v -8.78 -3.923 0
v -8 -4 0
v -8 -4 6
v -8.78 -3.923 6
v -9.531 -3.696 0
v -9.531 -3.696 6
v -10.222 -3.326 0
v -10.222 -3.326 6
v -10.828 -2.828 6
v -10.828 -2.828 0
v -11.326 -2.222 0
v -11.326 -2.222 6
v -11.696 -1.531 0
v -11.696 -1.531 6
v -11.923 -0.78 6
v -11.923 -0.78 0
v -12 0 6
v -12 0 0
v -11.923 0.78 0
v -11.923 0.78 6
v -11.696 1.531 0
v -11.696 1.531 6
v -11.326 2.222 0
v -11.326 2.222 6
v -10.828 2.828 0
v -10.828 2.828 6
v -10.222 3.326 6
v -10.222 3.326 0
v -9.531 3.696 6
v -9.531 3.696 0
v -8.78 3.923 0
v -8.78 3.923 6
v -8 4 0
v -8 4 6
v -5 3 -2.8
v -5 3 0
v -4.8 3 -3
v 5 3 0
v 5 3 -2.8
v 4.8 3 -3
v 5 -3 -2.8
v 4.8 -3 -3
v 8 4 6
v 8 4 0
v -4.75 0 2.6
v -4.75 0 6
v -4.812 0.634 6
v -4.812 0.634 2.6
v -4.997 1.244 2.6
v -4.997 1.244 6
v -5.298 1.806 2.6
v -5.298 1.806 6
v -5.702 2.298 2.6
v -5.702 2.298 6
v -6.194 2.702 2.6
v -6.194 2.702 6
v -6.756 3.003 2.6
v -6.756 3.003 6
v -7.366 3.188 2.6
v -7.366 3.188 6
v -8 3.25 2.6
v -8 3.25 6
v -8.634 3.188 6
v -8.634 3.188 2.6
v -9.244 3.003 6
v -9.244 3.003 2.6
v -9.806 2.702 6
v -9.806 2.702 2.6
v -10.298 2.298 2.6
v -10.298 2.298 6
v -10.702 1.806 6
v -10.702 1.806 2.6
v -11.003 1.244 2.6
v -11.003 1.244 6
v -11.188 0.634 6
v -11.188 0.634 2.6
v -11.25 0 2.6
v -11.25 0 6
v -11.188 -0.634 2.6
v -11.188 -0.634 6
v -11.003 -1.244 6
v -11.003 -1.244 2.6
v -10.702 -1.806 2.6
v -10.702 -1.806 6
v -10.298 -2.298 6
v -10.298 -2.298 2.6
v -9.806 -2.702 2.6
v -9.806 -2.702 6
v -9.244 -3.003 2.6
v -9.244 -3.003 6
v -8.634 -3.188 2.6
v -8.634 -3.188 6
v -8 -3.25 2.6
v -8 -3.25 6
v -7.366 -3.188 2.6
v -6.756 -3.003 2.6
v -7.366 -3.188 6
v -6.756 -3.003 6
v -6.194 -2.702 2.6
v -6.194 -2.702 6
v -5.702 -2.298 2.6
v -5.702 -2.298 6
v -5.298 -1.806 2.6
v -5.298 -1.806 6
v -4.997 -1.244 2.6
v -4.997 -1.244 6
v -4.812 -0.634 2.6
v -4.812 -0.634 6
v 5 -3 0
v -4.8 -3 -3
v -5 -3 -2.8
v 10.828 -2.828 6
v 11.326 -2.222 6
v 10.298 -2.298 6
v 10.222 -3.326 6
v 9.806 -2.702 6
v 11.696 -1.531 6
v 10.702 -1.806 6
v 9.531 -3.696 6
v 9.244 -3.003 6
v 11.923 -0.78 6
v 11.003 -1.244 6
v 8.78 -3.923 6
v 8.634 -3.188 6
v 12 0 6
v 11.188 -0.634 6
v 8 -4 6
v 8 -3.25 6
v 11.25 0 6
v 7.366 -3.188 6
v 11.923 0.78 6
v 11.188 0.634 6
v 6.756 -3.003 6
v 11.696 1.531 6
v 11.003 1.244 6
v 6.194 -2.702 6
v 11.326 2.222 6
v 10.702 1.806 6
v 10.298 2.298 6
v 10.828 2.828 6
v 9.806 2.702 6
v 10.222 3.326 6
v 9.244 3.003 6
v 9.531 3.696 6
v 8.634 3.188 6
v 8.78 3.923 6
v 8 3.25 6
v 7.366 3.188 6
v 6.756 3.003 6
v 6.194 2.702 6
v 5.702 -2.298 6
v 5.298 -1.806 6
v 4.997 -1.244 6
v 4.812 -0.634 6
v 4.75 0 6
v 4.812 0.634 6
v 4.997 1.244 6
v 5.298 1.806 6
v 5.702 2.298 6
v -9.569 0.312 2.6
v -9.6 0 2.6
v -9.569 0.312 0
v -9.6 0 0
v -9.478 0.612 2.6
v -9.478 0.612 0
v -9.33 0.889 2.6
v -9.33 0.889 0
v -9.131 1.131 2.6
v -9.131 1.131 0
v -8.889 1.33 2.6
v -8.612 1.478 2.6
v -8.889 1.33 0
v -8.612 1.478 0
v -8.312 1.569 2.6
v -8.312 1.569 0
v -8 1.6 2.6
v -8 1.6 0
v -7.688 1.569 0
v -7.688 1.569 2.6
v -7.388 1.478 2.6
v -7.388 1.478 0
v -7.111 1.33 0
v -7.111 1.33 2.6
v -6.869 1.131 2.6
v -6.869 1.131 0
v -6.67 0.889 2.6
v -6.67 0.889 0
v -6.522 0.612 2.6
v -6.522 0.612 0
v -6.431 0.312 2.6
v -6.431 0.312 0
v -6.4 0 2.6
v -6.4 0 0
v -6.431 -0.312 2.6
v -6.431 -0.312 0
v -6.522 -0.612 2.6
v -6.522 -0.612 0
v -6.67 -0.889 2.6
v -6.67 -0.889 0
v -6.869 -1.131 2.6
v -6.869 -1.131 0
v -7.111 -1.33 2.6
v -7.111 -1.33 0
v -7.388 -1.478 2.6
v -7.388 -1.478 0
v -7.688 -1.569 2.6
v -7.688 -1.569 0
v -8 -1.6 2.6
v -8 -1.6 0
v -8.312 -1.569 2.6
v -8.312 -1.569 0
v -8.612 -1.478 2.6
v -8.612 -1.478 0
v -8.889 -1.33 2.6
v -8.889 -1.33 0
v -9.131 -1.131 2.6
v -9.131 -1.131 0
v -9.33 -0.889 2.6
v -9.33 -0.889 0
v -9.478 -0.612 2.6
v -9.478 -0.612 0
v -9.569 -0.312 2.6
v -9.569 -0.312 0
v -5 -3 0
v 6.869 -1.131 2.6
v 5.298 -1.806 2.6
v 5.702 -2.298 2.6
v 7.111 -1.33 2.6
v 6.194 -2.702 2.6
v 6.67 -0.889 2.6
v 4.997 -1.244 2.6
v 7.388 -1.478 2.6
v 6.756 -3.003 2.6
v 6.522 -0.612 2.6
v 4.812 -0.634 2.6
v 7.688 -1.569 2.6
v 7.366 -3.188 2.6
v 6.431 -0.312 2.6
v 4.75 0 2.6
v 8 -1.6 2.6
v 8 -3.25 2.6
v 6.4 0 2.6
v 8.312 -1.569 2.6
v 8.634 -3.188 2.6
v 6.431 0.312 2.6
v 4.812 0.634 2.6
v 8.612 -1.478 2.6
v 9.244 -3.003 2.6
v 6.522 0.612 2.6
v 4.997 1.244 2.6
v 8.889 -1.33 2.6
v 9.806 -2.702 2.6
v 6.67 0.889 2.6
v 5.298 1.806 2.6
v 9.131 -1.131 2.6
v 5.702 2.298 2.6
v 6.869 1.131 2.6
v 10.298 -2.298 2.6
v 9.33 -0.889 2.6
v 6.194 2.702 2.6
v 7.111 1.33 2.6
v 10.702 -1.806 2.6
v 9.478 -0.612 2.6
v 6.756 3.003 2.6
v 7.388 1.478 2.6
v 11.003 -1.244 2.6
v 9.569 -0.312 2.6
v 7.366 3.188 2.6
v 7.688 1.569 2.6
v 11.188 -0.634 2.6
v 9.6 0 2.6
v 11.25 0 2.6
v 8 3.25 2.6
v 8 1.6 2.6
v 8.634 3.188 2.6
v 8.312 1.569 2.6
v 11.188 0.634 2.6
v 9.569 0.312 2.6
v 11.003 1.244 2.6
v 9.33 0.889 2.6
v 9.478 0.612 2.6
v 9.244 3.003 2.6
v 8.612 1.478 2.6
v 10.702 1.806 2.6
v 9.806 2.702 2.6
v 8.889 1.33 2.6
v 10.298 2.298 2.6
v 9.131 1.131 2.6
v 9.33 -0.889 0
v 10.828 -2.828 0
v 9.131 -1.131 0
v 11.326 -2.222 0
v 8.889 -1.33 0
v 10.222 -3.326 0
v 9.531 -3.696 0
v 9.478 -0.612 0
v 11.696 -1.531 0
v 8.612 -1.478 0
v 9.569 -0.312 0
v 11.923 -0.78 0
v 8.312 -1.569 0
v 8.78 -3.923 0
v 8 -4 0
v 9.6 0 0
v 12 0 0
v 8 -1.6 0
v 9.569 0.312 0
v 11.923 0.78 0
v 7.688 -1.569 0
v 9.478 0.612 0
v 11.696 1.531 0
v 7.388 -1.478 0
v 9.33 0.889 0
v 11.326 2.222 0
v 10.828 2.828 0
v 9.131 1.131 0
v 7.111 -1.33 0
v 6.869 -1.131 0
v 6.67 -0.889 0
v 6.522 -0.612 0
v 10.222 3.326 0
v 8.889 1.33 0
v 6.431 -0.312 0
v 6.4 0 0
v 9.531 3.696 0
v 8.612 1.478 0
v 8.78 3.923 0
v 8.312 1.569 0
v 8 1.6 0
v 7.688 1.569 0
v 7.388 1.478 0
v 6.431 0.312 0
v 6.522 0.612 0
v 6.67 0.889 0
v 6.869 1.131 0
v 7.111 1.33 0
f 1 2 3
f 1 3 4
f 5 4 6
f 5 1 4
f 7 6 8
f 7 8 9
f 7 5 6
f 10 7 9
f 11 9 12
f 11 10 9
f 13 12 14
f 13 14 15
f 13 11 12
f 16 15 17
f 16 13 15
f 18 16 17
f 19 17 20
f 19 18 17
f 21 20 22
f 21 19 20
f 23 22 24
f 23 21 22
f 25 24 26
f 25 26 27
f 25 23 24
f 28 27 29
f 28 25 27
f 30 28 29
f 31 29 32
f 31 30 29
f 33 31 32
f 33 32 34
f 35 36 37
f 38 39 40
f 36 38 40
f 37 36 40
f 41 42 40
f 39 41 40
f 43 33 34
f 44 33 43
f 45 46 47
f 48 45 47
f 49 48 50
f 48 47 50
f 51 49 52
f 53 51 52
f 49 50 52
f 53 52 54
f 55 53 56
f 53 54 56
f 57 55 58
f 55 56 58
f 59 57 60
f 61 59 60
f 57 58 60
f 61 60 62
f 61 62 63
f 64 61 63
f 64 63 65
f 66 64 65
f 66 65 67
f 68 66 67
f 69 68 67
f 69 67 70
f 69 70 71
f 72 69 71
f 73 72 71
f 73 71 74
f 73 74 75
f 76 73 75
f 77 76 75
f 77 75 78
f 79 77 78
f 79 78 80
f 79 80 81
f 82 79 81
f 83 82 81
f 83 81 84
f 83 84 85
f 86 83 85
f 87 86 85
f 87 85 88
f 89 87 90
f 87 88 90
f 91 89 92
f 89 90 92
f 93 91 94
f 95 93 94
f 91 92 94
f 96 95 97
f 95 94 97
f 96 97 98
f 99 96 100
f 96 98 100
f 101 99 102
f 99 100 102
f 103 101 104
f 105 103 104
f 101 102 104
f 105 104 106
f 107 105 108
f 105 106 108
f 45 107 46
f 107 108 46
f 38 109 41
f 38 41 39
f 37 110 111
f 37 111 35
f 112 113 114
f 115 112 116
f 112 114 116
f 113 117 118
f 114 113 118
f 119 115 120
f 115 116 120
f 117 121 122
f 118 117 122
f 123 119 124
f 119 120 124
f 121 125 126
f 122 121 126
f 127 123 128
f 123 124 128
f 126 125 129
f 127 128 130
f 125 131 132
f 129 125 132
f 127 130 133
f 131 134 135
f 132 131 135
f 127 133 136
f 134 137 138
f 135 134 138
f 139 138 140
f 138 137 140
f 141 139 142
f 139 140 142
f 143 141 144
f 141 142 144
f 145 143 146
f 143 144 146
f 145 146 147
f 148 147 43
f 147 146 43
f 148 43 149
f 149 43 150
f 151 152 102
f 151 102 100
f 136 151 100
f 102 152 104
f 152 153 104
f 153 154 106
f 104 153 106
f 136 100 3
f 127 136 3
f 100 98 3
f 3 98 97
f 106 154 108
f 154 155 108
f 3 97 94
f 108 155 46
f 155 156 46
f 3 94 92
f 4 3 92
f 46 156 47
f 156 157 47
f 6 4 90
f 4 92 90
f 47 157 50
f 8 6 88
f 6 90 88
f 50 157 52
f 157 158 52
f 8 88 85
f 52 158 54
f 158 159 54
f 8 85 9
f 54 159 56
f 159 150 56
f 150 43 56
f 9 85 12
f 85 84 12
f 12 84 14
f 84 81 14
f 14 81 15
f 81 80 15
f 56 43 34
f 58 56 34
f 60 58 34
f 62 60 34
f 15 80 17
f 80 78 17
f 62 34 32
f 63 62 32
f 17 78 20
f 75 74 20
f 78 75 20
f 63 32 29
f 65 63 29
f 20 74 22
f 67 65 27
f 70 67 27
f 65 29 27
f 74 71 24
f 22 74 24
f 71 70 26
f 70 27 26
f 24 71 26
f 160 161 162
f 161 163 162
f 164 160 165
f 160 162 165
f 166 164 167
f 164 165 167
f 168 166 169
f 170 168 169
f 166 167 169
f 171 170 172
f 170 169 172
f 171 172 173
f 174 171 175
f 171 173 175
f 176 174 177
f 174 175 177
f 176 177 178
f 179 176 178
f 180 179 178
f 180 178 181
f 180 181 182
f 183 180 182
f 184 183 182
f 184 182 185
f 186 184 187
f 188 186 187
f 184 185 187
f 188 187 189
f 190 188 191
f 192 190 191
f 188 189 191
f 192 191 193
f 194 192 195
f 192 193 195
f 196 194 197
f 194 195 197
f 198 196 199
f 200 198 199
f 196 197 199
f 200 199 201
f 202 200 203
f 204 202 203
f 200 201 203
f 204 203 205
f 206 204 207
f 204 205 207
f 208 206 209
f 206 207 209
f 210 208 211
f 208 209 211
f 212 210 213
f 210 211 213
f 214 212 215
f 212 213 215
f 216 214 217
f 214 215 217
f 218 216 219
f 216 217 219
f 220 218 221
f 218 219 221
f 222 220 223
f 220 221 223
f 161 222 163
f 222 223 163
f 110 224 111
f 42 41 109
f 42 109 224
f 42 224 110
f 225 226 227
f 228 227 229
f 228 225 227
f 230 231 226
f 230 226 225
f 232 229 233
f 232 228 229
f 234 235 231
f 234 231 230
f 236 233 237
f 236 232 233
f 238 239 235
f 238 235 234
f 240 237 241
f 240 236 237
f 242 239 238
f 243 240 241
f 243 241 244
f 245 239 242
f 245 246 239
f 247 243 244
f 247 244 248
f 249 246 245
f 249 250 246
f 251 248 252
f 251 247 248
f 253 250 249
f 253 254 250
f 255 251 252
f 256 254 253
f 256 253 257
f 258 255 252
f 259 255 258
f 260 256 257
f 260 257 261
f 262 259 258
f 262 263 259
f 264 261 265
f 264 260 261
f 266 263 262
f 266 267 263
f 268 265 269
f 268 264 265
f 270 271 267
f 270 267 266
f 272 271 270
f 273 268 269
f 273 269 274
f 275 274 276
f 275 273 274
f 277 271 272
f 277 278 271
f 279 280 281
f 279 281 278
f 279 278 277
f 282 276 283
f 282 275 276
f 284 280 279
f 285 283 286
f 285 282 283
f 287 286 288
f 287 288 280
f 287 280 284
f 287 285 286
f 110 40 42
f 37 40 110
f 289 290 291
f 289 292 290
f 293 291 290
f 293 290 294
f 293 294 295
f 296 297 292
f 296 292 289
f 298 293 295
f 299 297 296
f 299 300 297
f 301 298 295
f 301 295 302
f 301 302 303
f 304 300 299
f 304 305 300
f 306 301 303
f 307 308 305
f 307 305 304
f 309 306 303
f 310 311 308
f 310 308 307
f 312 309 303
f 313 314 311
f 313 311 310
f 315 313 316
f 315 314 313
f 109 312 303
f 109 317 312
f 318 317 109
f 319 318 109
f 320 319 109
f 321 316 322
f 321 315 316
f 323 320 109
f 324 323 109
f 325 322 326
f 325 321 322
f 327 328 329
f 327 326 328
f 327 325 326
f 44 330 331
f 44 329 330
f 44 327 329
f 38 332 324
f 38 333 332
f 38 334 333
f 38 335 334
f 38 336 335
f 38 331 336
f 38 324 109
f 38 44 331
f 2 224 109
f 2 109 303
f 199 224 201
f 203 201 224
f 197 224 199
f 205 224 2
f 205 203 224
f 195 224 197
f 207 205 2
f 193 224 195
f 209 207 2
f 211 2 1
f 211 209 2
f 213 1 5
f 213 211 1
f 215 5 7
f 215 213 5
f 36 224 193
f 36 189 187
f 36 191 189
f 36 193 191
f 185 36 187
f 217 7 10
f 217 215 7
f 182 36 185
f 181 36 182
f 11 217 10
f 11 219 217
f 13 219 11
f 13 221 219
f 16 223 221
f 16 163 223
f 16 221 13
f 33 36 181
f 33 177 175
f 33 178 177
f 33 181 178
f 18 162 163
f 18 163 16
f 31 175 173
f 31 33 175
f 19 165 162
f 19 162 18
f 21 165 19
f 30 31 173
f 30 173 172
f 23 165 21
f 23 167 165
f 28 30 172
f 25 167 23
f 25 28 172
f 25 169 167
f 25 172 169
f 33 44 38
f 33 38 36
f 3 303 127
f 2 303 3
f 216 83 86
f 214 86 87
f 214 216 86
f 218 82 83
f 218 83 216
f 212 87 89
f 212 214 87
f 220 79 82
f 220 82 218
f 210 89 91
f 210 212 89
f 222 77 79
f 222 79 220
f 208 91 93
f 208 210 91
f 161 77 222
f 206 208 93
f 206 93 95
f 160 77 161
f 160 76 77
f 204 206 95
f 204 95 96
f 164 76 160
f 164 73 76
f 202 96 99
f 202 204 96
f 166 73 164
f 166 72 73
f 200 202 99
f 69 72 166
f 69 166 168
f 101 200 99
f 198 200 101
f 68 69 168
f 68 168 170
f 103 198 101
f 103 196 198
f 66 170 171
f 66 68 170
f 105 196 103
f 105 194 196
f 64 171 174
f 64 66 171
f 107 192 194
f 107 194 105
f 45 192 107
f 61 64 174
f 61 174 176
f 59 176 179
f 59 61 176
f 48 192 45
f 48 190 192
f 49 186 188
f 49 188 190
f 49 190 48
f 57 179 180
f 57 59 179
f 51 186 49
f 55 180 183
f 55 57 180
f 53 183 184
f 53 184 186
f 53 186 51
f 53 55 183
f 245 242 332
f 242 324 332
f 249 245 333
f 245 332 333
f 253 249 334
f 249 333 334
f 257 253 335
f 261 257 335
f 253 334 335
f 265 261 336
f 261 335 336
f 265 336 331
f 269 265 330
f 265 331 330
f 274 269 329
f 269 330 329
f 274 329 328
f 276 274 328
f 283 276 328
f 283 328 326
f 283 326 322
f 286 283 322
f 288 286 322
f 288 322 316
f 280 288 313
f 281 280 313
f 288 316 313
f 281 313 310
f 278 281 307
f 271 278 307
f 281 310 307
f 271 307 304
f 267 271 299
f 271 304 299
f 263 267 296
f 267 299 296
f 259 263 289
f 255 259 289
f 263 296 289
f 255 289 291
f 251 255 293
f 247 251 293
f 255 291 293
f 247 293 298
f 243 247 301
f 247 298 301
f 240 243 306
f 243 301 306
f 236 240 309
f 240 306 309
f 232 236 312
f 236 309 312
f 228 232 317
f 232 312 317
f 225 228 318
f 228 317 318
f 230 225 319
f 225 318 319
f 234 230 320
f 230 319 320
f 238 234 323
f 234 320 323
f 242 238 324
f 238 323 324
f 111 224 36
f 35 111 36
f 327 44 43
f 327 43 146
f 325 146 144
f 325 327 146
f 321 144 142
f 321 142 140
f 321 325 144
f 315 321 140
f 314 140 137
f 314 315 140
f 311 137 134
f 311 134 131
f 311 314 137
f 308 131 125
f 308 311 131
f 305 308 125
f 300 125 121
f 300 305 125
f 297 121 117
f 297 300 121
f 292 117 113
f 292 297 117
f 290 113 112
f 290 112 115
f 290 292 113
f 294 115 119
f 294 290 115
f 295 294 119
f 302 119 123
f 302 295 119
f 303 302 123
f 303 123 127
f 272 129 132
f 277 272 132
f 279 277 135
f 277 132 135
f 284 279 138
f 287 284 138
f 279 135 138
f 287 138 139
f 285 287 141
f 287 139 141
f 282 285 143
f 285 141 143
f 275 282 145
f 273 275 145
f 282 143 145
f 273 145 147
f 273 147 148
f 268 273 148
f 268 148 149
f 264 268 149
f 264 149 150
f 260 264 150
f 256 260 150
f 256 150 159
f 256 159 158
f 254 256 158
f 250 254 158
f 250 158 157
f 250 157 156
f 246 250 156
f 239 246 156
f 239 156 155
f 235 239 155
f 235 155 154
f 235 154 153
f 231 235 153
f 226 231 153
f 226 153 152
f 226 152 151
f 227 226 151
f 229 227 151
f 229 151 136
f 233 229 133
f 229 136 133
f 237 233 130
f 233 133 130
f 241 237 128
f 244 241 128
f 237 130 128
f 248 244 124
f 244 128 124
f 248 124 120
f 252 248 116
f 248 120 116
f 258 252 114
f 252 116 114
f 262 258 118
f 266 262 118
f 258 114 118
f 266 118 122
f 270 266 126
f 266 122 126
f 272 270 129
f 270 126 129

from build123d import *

# Parameters (mm, degrees)
BOSS_EXTRU_1_DEPTH                                 = 6
CHAMBRAGE_POUR_VIS_T_TE_HEXAGONALE_M31_D           = 3.2
CHAMBRAGE_POUR_VIS_T_TE_HEXAGONALE_M31_CBORE_D     = 6.5
CHAMBRAGE_POUR_VIS_T_TE_HEXAGONALE_M31_CBORE_DEPTH = 3.4
ESQUISSE6_W                                        = 10
ESQUISSE6_H                                        = 8
BOSS_EXTRU_2_DEPTH                                 = 3
CHANFREIN1_SIZE                                    = 0.2
ENL_V_MAT_EXTRU_5_REACH                            = 20.466
ESQUISSE10_W                                       = 3
ESQUISSE10_H                                       = 1


with BuildPart() as part:
    # Esquisse1 → Boss.-Extru.1 (new body)
    with BuildSketch(Plane.XY):
        with BuildLine():
            Line((-8, 4), (8, 4))
            ThreePointArc((8, 4), (12, 0), (8, -4))
            Line((8, -4), (-8, -4))
            ThreePointArc((-8, -4), (-12, 0), (-8, 4))
        make_face()
    extrude(amount=BOSS_EXTRU_1_DEPTH)

    # Chambrage pour vis à tête hexagonale M31 (through all)
    with Locations(Plane.XY.offset(6)):
        with Locations((-8, 0), (8, 0)):
            CounterBoreHole(CHAMBRAGE_POUR_VIS_T_TE_HEXAGONALE_M31_D / 2, CHAMBRAGE_POUR_VIS_T_TE_HEXAGONALE_M31_CBORE_D / 2, CHAMBRAGE_POUR_VIS_T_TE_HEXAGONALE_M31_CBORE_DEPTH)

    # Esquisse6 → Boss.-Extru.2 (add)
    with BuildSketch(Plane(origin=(0, 0, 0), x_dir=(-1, 0, 0), z_dir=(0, 0, -1))):
        Rectangle(ESQUISSE6_W, ESQUISSE6_H)
    extrude(amount=BOSS_EXTRU_2_DEPTH)

    # Chanfrein1
    chanfrein1_edges = [part.edges().sort_by_distance(p)[0] for p in [
        (5, 0, -3),
        (-5, 0, -3),
    ]]
    chamfer(chanfrein1_edges, length=CHANFREIN1_SIZE)

    # Esquisse10 → Enlèv. mat.-Extru.5 (cut, up to next)
    with BuildSketch(Plane(origin=(5, 0, 0), x_dir=(0, 0, -1), z_dir=(1, 0, 0)), mode=Mode.PRIVATE) as enl_v_mat_extru_5_sk1:
        with Locations((1.5, 3.5)):
            Rectangle(ESQUISSE10_W, ESQUISSE10_H)
    enl_v_mat_extru_5_tool1 = extrude(enl_v_mat_extru_5_sk1.sketch, amount=-ENL_V_MAT_EXTRU_5_REACH, mode=Mode.PRIVATE) & part.part
    # Esquisse10 → Enlèv. mat.-Extru.5 (cut, up to next)
    with BuildSketch(Plane(origin=(5, 0, 0), x_dir=(0, 0, -1), z_dir=(1, 0, 0)), mode=Mode.PRIVATE) as enl_v_mat_extru_5_sk2:
        with Locations((1.5, -3.5)):
            Rectangle(ESQUISSE10_W, ESQUISSE10_H)
    enl_v_mat_extru_5_tool2 = extrude(enl_v_mat_extru_5_sk2.sketch, amount=-ENL_V_MAT_EXTRU_5_REACH, mode=Mode.PRIVATE) & part.part
    add(enl_v_mat_extru_5_tool1.solids().sort_by_distance((5, 3.5, -1.5))[0], mode=Mode.SUBTRACT)
    add(enl_v_mat_extru_5_tool2.solids().sort_by_distance((5, -3.5, -1.5))[0], mode=Mode.SUBTRACT)


solid = part.part
